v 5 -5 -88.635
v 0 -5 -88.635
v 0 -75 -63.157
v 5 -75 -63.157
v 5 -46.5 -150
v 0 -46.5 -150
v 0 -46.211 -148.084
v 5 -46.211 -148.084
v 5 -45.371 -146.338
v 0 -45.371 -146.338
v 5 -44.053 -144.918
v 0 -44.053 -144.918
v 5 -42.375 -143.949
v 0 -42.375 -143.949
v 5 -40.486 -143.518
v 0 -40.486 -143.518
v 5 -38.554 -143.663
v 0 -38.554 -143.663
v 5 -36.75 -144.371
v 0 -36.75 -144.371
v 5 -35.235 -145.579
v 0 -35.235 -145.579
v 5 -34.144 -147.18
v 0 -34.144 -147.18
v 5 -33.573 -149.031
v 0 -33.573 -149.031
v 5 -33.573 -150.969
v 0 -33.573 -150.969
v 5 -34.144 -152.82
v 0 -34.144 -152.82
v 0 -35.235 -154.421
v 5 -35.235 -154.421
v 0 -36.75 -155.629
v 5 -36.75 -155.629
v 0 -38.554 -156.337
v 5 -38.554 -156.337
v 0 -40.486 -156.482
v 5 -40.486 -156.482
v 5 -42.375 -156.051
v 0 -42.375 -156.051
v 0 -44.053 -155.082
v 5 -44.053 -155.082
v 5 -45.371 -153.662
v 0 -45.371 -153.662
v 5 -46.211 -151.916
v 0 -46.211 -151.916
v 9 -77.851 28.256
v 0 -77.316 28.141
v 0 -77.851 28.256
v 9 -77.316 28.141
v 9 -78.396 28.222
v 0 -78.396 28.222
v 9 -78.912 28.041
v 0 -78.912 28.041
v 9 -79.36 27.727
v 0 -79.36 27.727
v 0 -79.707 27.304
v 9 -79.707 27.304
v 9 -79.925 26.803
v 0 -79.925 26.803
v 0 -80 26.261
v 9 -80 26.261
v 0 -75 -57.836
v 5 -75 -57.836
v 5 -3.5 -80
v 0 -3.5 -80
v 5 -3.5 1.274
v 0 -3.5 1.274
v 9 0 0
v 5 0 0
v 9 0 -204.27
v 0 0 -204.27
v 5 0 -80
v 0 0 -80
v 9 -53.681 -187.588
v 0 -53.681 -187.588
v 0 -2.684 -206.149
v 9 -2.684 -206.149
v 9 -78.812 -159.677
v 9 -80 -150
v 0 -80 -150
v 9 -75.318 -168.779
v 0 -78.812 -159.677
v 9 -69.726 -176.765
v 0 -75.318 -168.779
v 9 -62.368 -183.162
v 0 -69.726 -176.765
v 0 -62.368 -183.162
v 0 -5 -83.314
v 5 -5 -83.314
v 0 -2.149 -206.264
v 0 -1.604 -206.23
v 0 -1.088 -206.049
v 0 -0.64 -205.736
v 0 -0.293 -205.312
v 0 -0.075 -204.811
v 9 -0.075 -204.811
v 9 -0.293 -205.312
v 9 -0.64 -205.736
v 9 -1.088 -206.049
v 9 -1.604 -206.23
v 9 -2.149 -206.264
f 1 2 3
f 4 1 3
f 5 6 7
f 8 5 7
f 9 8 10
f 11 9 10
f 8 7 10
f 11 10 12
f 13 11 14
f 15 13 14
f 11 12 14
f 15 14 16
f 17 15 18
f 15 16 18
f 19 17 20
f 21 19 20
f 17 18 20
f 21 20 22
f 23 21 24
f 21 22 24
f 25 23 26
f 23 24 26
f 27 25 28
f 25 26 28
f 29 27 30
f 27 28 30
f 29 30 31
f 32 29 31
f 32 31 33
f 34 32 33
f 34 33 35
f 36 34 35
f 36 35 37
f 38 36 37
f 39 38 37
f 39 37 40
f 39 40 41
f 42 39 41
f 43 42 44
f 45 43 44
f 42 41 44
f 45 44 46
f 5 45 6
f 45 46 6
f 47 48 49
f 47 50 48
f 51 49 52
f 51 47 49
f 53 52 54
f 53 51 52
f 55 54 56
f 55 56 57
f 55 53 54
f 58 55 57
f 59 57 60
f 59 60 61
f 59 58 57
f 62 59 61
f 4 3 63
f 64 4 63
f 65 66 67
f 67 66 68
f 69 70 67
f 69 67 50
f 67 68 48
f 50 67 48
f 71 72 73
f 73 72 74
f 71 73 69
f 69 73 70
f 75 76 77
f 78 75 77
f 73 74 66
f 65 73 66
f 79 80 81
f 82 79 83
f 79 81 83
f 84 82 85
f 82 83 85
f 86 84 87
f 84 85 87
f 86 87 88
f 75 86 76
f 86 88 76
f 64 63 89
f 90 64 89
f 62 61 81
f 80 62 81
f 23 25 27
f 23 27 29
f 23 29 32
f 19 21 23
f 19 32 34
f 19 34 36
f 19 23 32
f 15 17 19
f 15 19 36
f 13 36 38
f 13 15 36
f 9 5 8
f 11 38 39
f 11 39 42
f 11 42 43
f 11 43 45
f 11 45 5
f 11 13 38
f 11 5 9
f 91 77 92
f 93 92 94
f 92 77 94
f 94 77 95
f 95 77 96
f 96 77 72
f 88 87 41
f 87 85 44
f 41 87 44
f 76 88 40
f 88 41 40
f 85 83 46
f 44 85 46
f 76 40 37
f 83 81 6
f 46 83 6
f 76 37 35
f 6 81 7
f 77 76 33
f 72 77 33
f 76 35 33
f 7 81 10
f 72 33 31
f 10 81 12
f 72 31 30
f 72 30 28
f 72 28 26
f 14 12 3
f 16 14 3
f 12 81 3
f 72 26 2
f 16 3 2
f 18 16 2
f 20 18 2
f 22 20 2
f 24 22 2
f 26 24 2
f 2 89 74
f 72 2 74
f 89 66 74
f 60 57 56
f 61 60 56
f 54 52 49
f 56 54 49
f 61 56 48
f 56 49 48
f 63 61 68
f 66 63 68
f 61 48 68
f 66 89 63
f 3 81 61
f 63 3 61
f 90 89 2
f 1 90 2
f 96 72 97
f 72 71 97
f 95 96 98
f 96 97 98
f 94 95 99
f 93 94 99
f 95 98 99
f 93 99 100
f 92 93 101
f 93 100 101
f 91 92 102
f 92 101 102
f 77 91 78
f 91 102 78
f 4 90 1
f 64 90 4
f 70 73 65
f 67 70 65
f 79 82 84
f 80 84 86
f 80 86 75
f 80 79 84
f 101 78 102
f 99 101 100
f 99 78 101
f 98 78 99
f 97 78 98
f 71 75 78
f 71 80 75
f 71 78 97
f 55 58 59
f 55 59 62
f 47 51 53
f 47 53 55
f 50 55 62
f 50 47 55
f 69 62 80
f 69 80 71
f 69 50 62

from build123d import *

# Parameters (mm, degrees)
F1_DEPTH = 9
F2_R     = 6.5
F3_DEPTH = 5
F5_DEPTH = 5
F6_R     = 2
F8_DEPTH = 5


with BuildPart() as f1:
    # F0 (on Right) → F1 (new body)
    with BuildSketch(Plane.YZ):
        with BuildLine():
            Line((0, -207.12592), (0, 0))
            Line((0, 0), (-80, 29.117619))
            Line((-80, 29.117619), (-80, -150))
            ThreePointArc((-80, -150), (-72.766082, -172.943057), (-53.680806, -187.587705))
            Line((-53.680806, -187.587705), (0, -207.12592))
        make_face()
    extrude(amount=F1_DEPTH)

    # F2 (on face) → F3 (cut)
    with BuildSketch(Plane(origin=(0, 0, 0), x_dir=(0, -1, 0), z_dir=(-1, 0, 0))):
        with Locations((40, -150)):
            Circle(F2_R)
    extrude(amount=-F3_DEPTH, mode=Mode.SUBTRACT)

    # F4 (on face) → F5 (cut)
    with BuildSketch(Plane(origin=(0, 0, 0), x_dir=(0, -1, 0), z_dir=(-1, 0, 0))):
        Polygon((75, -57.836454), (5, -83.314371), (5, -88.635259), (75, -63.157343), align=None)
    extrude(amount=-F5_DEPTH, mode=Mode.SUBTRACT)

    # F6
    f6_edges = [f1.edges().sort_by_distance(p)[0] for p in [
        (4.5, 0, -207.12592),
        (4.5, -80, 29.117619),
    ]]
    fillet(f6_edges, radius=F6_R)

    # F7 (on face) → F8 (cut)
    with BuildSketch(Plane(origin=(0, 0, 0), x_dir=(0, -1, 0), z_dir=(-1, 0, 0))):
        Polygon((3.5, -80), (3.5, 1.273896), (0, 0), (0, -80), align=None)
    extrude(amount=-F8_DEPTH, mode=Mode.SUBTRACT)


solid = f1.part
